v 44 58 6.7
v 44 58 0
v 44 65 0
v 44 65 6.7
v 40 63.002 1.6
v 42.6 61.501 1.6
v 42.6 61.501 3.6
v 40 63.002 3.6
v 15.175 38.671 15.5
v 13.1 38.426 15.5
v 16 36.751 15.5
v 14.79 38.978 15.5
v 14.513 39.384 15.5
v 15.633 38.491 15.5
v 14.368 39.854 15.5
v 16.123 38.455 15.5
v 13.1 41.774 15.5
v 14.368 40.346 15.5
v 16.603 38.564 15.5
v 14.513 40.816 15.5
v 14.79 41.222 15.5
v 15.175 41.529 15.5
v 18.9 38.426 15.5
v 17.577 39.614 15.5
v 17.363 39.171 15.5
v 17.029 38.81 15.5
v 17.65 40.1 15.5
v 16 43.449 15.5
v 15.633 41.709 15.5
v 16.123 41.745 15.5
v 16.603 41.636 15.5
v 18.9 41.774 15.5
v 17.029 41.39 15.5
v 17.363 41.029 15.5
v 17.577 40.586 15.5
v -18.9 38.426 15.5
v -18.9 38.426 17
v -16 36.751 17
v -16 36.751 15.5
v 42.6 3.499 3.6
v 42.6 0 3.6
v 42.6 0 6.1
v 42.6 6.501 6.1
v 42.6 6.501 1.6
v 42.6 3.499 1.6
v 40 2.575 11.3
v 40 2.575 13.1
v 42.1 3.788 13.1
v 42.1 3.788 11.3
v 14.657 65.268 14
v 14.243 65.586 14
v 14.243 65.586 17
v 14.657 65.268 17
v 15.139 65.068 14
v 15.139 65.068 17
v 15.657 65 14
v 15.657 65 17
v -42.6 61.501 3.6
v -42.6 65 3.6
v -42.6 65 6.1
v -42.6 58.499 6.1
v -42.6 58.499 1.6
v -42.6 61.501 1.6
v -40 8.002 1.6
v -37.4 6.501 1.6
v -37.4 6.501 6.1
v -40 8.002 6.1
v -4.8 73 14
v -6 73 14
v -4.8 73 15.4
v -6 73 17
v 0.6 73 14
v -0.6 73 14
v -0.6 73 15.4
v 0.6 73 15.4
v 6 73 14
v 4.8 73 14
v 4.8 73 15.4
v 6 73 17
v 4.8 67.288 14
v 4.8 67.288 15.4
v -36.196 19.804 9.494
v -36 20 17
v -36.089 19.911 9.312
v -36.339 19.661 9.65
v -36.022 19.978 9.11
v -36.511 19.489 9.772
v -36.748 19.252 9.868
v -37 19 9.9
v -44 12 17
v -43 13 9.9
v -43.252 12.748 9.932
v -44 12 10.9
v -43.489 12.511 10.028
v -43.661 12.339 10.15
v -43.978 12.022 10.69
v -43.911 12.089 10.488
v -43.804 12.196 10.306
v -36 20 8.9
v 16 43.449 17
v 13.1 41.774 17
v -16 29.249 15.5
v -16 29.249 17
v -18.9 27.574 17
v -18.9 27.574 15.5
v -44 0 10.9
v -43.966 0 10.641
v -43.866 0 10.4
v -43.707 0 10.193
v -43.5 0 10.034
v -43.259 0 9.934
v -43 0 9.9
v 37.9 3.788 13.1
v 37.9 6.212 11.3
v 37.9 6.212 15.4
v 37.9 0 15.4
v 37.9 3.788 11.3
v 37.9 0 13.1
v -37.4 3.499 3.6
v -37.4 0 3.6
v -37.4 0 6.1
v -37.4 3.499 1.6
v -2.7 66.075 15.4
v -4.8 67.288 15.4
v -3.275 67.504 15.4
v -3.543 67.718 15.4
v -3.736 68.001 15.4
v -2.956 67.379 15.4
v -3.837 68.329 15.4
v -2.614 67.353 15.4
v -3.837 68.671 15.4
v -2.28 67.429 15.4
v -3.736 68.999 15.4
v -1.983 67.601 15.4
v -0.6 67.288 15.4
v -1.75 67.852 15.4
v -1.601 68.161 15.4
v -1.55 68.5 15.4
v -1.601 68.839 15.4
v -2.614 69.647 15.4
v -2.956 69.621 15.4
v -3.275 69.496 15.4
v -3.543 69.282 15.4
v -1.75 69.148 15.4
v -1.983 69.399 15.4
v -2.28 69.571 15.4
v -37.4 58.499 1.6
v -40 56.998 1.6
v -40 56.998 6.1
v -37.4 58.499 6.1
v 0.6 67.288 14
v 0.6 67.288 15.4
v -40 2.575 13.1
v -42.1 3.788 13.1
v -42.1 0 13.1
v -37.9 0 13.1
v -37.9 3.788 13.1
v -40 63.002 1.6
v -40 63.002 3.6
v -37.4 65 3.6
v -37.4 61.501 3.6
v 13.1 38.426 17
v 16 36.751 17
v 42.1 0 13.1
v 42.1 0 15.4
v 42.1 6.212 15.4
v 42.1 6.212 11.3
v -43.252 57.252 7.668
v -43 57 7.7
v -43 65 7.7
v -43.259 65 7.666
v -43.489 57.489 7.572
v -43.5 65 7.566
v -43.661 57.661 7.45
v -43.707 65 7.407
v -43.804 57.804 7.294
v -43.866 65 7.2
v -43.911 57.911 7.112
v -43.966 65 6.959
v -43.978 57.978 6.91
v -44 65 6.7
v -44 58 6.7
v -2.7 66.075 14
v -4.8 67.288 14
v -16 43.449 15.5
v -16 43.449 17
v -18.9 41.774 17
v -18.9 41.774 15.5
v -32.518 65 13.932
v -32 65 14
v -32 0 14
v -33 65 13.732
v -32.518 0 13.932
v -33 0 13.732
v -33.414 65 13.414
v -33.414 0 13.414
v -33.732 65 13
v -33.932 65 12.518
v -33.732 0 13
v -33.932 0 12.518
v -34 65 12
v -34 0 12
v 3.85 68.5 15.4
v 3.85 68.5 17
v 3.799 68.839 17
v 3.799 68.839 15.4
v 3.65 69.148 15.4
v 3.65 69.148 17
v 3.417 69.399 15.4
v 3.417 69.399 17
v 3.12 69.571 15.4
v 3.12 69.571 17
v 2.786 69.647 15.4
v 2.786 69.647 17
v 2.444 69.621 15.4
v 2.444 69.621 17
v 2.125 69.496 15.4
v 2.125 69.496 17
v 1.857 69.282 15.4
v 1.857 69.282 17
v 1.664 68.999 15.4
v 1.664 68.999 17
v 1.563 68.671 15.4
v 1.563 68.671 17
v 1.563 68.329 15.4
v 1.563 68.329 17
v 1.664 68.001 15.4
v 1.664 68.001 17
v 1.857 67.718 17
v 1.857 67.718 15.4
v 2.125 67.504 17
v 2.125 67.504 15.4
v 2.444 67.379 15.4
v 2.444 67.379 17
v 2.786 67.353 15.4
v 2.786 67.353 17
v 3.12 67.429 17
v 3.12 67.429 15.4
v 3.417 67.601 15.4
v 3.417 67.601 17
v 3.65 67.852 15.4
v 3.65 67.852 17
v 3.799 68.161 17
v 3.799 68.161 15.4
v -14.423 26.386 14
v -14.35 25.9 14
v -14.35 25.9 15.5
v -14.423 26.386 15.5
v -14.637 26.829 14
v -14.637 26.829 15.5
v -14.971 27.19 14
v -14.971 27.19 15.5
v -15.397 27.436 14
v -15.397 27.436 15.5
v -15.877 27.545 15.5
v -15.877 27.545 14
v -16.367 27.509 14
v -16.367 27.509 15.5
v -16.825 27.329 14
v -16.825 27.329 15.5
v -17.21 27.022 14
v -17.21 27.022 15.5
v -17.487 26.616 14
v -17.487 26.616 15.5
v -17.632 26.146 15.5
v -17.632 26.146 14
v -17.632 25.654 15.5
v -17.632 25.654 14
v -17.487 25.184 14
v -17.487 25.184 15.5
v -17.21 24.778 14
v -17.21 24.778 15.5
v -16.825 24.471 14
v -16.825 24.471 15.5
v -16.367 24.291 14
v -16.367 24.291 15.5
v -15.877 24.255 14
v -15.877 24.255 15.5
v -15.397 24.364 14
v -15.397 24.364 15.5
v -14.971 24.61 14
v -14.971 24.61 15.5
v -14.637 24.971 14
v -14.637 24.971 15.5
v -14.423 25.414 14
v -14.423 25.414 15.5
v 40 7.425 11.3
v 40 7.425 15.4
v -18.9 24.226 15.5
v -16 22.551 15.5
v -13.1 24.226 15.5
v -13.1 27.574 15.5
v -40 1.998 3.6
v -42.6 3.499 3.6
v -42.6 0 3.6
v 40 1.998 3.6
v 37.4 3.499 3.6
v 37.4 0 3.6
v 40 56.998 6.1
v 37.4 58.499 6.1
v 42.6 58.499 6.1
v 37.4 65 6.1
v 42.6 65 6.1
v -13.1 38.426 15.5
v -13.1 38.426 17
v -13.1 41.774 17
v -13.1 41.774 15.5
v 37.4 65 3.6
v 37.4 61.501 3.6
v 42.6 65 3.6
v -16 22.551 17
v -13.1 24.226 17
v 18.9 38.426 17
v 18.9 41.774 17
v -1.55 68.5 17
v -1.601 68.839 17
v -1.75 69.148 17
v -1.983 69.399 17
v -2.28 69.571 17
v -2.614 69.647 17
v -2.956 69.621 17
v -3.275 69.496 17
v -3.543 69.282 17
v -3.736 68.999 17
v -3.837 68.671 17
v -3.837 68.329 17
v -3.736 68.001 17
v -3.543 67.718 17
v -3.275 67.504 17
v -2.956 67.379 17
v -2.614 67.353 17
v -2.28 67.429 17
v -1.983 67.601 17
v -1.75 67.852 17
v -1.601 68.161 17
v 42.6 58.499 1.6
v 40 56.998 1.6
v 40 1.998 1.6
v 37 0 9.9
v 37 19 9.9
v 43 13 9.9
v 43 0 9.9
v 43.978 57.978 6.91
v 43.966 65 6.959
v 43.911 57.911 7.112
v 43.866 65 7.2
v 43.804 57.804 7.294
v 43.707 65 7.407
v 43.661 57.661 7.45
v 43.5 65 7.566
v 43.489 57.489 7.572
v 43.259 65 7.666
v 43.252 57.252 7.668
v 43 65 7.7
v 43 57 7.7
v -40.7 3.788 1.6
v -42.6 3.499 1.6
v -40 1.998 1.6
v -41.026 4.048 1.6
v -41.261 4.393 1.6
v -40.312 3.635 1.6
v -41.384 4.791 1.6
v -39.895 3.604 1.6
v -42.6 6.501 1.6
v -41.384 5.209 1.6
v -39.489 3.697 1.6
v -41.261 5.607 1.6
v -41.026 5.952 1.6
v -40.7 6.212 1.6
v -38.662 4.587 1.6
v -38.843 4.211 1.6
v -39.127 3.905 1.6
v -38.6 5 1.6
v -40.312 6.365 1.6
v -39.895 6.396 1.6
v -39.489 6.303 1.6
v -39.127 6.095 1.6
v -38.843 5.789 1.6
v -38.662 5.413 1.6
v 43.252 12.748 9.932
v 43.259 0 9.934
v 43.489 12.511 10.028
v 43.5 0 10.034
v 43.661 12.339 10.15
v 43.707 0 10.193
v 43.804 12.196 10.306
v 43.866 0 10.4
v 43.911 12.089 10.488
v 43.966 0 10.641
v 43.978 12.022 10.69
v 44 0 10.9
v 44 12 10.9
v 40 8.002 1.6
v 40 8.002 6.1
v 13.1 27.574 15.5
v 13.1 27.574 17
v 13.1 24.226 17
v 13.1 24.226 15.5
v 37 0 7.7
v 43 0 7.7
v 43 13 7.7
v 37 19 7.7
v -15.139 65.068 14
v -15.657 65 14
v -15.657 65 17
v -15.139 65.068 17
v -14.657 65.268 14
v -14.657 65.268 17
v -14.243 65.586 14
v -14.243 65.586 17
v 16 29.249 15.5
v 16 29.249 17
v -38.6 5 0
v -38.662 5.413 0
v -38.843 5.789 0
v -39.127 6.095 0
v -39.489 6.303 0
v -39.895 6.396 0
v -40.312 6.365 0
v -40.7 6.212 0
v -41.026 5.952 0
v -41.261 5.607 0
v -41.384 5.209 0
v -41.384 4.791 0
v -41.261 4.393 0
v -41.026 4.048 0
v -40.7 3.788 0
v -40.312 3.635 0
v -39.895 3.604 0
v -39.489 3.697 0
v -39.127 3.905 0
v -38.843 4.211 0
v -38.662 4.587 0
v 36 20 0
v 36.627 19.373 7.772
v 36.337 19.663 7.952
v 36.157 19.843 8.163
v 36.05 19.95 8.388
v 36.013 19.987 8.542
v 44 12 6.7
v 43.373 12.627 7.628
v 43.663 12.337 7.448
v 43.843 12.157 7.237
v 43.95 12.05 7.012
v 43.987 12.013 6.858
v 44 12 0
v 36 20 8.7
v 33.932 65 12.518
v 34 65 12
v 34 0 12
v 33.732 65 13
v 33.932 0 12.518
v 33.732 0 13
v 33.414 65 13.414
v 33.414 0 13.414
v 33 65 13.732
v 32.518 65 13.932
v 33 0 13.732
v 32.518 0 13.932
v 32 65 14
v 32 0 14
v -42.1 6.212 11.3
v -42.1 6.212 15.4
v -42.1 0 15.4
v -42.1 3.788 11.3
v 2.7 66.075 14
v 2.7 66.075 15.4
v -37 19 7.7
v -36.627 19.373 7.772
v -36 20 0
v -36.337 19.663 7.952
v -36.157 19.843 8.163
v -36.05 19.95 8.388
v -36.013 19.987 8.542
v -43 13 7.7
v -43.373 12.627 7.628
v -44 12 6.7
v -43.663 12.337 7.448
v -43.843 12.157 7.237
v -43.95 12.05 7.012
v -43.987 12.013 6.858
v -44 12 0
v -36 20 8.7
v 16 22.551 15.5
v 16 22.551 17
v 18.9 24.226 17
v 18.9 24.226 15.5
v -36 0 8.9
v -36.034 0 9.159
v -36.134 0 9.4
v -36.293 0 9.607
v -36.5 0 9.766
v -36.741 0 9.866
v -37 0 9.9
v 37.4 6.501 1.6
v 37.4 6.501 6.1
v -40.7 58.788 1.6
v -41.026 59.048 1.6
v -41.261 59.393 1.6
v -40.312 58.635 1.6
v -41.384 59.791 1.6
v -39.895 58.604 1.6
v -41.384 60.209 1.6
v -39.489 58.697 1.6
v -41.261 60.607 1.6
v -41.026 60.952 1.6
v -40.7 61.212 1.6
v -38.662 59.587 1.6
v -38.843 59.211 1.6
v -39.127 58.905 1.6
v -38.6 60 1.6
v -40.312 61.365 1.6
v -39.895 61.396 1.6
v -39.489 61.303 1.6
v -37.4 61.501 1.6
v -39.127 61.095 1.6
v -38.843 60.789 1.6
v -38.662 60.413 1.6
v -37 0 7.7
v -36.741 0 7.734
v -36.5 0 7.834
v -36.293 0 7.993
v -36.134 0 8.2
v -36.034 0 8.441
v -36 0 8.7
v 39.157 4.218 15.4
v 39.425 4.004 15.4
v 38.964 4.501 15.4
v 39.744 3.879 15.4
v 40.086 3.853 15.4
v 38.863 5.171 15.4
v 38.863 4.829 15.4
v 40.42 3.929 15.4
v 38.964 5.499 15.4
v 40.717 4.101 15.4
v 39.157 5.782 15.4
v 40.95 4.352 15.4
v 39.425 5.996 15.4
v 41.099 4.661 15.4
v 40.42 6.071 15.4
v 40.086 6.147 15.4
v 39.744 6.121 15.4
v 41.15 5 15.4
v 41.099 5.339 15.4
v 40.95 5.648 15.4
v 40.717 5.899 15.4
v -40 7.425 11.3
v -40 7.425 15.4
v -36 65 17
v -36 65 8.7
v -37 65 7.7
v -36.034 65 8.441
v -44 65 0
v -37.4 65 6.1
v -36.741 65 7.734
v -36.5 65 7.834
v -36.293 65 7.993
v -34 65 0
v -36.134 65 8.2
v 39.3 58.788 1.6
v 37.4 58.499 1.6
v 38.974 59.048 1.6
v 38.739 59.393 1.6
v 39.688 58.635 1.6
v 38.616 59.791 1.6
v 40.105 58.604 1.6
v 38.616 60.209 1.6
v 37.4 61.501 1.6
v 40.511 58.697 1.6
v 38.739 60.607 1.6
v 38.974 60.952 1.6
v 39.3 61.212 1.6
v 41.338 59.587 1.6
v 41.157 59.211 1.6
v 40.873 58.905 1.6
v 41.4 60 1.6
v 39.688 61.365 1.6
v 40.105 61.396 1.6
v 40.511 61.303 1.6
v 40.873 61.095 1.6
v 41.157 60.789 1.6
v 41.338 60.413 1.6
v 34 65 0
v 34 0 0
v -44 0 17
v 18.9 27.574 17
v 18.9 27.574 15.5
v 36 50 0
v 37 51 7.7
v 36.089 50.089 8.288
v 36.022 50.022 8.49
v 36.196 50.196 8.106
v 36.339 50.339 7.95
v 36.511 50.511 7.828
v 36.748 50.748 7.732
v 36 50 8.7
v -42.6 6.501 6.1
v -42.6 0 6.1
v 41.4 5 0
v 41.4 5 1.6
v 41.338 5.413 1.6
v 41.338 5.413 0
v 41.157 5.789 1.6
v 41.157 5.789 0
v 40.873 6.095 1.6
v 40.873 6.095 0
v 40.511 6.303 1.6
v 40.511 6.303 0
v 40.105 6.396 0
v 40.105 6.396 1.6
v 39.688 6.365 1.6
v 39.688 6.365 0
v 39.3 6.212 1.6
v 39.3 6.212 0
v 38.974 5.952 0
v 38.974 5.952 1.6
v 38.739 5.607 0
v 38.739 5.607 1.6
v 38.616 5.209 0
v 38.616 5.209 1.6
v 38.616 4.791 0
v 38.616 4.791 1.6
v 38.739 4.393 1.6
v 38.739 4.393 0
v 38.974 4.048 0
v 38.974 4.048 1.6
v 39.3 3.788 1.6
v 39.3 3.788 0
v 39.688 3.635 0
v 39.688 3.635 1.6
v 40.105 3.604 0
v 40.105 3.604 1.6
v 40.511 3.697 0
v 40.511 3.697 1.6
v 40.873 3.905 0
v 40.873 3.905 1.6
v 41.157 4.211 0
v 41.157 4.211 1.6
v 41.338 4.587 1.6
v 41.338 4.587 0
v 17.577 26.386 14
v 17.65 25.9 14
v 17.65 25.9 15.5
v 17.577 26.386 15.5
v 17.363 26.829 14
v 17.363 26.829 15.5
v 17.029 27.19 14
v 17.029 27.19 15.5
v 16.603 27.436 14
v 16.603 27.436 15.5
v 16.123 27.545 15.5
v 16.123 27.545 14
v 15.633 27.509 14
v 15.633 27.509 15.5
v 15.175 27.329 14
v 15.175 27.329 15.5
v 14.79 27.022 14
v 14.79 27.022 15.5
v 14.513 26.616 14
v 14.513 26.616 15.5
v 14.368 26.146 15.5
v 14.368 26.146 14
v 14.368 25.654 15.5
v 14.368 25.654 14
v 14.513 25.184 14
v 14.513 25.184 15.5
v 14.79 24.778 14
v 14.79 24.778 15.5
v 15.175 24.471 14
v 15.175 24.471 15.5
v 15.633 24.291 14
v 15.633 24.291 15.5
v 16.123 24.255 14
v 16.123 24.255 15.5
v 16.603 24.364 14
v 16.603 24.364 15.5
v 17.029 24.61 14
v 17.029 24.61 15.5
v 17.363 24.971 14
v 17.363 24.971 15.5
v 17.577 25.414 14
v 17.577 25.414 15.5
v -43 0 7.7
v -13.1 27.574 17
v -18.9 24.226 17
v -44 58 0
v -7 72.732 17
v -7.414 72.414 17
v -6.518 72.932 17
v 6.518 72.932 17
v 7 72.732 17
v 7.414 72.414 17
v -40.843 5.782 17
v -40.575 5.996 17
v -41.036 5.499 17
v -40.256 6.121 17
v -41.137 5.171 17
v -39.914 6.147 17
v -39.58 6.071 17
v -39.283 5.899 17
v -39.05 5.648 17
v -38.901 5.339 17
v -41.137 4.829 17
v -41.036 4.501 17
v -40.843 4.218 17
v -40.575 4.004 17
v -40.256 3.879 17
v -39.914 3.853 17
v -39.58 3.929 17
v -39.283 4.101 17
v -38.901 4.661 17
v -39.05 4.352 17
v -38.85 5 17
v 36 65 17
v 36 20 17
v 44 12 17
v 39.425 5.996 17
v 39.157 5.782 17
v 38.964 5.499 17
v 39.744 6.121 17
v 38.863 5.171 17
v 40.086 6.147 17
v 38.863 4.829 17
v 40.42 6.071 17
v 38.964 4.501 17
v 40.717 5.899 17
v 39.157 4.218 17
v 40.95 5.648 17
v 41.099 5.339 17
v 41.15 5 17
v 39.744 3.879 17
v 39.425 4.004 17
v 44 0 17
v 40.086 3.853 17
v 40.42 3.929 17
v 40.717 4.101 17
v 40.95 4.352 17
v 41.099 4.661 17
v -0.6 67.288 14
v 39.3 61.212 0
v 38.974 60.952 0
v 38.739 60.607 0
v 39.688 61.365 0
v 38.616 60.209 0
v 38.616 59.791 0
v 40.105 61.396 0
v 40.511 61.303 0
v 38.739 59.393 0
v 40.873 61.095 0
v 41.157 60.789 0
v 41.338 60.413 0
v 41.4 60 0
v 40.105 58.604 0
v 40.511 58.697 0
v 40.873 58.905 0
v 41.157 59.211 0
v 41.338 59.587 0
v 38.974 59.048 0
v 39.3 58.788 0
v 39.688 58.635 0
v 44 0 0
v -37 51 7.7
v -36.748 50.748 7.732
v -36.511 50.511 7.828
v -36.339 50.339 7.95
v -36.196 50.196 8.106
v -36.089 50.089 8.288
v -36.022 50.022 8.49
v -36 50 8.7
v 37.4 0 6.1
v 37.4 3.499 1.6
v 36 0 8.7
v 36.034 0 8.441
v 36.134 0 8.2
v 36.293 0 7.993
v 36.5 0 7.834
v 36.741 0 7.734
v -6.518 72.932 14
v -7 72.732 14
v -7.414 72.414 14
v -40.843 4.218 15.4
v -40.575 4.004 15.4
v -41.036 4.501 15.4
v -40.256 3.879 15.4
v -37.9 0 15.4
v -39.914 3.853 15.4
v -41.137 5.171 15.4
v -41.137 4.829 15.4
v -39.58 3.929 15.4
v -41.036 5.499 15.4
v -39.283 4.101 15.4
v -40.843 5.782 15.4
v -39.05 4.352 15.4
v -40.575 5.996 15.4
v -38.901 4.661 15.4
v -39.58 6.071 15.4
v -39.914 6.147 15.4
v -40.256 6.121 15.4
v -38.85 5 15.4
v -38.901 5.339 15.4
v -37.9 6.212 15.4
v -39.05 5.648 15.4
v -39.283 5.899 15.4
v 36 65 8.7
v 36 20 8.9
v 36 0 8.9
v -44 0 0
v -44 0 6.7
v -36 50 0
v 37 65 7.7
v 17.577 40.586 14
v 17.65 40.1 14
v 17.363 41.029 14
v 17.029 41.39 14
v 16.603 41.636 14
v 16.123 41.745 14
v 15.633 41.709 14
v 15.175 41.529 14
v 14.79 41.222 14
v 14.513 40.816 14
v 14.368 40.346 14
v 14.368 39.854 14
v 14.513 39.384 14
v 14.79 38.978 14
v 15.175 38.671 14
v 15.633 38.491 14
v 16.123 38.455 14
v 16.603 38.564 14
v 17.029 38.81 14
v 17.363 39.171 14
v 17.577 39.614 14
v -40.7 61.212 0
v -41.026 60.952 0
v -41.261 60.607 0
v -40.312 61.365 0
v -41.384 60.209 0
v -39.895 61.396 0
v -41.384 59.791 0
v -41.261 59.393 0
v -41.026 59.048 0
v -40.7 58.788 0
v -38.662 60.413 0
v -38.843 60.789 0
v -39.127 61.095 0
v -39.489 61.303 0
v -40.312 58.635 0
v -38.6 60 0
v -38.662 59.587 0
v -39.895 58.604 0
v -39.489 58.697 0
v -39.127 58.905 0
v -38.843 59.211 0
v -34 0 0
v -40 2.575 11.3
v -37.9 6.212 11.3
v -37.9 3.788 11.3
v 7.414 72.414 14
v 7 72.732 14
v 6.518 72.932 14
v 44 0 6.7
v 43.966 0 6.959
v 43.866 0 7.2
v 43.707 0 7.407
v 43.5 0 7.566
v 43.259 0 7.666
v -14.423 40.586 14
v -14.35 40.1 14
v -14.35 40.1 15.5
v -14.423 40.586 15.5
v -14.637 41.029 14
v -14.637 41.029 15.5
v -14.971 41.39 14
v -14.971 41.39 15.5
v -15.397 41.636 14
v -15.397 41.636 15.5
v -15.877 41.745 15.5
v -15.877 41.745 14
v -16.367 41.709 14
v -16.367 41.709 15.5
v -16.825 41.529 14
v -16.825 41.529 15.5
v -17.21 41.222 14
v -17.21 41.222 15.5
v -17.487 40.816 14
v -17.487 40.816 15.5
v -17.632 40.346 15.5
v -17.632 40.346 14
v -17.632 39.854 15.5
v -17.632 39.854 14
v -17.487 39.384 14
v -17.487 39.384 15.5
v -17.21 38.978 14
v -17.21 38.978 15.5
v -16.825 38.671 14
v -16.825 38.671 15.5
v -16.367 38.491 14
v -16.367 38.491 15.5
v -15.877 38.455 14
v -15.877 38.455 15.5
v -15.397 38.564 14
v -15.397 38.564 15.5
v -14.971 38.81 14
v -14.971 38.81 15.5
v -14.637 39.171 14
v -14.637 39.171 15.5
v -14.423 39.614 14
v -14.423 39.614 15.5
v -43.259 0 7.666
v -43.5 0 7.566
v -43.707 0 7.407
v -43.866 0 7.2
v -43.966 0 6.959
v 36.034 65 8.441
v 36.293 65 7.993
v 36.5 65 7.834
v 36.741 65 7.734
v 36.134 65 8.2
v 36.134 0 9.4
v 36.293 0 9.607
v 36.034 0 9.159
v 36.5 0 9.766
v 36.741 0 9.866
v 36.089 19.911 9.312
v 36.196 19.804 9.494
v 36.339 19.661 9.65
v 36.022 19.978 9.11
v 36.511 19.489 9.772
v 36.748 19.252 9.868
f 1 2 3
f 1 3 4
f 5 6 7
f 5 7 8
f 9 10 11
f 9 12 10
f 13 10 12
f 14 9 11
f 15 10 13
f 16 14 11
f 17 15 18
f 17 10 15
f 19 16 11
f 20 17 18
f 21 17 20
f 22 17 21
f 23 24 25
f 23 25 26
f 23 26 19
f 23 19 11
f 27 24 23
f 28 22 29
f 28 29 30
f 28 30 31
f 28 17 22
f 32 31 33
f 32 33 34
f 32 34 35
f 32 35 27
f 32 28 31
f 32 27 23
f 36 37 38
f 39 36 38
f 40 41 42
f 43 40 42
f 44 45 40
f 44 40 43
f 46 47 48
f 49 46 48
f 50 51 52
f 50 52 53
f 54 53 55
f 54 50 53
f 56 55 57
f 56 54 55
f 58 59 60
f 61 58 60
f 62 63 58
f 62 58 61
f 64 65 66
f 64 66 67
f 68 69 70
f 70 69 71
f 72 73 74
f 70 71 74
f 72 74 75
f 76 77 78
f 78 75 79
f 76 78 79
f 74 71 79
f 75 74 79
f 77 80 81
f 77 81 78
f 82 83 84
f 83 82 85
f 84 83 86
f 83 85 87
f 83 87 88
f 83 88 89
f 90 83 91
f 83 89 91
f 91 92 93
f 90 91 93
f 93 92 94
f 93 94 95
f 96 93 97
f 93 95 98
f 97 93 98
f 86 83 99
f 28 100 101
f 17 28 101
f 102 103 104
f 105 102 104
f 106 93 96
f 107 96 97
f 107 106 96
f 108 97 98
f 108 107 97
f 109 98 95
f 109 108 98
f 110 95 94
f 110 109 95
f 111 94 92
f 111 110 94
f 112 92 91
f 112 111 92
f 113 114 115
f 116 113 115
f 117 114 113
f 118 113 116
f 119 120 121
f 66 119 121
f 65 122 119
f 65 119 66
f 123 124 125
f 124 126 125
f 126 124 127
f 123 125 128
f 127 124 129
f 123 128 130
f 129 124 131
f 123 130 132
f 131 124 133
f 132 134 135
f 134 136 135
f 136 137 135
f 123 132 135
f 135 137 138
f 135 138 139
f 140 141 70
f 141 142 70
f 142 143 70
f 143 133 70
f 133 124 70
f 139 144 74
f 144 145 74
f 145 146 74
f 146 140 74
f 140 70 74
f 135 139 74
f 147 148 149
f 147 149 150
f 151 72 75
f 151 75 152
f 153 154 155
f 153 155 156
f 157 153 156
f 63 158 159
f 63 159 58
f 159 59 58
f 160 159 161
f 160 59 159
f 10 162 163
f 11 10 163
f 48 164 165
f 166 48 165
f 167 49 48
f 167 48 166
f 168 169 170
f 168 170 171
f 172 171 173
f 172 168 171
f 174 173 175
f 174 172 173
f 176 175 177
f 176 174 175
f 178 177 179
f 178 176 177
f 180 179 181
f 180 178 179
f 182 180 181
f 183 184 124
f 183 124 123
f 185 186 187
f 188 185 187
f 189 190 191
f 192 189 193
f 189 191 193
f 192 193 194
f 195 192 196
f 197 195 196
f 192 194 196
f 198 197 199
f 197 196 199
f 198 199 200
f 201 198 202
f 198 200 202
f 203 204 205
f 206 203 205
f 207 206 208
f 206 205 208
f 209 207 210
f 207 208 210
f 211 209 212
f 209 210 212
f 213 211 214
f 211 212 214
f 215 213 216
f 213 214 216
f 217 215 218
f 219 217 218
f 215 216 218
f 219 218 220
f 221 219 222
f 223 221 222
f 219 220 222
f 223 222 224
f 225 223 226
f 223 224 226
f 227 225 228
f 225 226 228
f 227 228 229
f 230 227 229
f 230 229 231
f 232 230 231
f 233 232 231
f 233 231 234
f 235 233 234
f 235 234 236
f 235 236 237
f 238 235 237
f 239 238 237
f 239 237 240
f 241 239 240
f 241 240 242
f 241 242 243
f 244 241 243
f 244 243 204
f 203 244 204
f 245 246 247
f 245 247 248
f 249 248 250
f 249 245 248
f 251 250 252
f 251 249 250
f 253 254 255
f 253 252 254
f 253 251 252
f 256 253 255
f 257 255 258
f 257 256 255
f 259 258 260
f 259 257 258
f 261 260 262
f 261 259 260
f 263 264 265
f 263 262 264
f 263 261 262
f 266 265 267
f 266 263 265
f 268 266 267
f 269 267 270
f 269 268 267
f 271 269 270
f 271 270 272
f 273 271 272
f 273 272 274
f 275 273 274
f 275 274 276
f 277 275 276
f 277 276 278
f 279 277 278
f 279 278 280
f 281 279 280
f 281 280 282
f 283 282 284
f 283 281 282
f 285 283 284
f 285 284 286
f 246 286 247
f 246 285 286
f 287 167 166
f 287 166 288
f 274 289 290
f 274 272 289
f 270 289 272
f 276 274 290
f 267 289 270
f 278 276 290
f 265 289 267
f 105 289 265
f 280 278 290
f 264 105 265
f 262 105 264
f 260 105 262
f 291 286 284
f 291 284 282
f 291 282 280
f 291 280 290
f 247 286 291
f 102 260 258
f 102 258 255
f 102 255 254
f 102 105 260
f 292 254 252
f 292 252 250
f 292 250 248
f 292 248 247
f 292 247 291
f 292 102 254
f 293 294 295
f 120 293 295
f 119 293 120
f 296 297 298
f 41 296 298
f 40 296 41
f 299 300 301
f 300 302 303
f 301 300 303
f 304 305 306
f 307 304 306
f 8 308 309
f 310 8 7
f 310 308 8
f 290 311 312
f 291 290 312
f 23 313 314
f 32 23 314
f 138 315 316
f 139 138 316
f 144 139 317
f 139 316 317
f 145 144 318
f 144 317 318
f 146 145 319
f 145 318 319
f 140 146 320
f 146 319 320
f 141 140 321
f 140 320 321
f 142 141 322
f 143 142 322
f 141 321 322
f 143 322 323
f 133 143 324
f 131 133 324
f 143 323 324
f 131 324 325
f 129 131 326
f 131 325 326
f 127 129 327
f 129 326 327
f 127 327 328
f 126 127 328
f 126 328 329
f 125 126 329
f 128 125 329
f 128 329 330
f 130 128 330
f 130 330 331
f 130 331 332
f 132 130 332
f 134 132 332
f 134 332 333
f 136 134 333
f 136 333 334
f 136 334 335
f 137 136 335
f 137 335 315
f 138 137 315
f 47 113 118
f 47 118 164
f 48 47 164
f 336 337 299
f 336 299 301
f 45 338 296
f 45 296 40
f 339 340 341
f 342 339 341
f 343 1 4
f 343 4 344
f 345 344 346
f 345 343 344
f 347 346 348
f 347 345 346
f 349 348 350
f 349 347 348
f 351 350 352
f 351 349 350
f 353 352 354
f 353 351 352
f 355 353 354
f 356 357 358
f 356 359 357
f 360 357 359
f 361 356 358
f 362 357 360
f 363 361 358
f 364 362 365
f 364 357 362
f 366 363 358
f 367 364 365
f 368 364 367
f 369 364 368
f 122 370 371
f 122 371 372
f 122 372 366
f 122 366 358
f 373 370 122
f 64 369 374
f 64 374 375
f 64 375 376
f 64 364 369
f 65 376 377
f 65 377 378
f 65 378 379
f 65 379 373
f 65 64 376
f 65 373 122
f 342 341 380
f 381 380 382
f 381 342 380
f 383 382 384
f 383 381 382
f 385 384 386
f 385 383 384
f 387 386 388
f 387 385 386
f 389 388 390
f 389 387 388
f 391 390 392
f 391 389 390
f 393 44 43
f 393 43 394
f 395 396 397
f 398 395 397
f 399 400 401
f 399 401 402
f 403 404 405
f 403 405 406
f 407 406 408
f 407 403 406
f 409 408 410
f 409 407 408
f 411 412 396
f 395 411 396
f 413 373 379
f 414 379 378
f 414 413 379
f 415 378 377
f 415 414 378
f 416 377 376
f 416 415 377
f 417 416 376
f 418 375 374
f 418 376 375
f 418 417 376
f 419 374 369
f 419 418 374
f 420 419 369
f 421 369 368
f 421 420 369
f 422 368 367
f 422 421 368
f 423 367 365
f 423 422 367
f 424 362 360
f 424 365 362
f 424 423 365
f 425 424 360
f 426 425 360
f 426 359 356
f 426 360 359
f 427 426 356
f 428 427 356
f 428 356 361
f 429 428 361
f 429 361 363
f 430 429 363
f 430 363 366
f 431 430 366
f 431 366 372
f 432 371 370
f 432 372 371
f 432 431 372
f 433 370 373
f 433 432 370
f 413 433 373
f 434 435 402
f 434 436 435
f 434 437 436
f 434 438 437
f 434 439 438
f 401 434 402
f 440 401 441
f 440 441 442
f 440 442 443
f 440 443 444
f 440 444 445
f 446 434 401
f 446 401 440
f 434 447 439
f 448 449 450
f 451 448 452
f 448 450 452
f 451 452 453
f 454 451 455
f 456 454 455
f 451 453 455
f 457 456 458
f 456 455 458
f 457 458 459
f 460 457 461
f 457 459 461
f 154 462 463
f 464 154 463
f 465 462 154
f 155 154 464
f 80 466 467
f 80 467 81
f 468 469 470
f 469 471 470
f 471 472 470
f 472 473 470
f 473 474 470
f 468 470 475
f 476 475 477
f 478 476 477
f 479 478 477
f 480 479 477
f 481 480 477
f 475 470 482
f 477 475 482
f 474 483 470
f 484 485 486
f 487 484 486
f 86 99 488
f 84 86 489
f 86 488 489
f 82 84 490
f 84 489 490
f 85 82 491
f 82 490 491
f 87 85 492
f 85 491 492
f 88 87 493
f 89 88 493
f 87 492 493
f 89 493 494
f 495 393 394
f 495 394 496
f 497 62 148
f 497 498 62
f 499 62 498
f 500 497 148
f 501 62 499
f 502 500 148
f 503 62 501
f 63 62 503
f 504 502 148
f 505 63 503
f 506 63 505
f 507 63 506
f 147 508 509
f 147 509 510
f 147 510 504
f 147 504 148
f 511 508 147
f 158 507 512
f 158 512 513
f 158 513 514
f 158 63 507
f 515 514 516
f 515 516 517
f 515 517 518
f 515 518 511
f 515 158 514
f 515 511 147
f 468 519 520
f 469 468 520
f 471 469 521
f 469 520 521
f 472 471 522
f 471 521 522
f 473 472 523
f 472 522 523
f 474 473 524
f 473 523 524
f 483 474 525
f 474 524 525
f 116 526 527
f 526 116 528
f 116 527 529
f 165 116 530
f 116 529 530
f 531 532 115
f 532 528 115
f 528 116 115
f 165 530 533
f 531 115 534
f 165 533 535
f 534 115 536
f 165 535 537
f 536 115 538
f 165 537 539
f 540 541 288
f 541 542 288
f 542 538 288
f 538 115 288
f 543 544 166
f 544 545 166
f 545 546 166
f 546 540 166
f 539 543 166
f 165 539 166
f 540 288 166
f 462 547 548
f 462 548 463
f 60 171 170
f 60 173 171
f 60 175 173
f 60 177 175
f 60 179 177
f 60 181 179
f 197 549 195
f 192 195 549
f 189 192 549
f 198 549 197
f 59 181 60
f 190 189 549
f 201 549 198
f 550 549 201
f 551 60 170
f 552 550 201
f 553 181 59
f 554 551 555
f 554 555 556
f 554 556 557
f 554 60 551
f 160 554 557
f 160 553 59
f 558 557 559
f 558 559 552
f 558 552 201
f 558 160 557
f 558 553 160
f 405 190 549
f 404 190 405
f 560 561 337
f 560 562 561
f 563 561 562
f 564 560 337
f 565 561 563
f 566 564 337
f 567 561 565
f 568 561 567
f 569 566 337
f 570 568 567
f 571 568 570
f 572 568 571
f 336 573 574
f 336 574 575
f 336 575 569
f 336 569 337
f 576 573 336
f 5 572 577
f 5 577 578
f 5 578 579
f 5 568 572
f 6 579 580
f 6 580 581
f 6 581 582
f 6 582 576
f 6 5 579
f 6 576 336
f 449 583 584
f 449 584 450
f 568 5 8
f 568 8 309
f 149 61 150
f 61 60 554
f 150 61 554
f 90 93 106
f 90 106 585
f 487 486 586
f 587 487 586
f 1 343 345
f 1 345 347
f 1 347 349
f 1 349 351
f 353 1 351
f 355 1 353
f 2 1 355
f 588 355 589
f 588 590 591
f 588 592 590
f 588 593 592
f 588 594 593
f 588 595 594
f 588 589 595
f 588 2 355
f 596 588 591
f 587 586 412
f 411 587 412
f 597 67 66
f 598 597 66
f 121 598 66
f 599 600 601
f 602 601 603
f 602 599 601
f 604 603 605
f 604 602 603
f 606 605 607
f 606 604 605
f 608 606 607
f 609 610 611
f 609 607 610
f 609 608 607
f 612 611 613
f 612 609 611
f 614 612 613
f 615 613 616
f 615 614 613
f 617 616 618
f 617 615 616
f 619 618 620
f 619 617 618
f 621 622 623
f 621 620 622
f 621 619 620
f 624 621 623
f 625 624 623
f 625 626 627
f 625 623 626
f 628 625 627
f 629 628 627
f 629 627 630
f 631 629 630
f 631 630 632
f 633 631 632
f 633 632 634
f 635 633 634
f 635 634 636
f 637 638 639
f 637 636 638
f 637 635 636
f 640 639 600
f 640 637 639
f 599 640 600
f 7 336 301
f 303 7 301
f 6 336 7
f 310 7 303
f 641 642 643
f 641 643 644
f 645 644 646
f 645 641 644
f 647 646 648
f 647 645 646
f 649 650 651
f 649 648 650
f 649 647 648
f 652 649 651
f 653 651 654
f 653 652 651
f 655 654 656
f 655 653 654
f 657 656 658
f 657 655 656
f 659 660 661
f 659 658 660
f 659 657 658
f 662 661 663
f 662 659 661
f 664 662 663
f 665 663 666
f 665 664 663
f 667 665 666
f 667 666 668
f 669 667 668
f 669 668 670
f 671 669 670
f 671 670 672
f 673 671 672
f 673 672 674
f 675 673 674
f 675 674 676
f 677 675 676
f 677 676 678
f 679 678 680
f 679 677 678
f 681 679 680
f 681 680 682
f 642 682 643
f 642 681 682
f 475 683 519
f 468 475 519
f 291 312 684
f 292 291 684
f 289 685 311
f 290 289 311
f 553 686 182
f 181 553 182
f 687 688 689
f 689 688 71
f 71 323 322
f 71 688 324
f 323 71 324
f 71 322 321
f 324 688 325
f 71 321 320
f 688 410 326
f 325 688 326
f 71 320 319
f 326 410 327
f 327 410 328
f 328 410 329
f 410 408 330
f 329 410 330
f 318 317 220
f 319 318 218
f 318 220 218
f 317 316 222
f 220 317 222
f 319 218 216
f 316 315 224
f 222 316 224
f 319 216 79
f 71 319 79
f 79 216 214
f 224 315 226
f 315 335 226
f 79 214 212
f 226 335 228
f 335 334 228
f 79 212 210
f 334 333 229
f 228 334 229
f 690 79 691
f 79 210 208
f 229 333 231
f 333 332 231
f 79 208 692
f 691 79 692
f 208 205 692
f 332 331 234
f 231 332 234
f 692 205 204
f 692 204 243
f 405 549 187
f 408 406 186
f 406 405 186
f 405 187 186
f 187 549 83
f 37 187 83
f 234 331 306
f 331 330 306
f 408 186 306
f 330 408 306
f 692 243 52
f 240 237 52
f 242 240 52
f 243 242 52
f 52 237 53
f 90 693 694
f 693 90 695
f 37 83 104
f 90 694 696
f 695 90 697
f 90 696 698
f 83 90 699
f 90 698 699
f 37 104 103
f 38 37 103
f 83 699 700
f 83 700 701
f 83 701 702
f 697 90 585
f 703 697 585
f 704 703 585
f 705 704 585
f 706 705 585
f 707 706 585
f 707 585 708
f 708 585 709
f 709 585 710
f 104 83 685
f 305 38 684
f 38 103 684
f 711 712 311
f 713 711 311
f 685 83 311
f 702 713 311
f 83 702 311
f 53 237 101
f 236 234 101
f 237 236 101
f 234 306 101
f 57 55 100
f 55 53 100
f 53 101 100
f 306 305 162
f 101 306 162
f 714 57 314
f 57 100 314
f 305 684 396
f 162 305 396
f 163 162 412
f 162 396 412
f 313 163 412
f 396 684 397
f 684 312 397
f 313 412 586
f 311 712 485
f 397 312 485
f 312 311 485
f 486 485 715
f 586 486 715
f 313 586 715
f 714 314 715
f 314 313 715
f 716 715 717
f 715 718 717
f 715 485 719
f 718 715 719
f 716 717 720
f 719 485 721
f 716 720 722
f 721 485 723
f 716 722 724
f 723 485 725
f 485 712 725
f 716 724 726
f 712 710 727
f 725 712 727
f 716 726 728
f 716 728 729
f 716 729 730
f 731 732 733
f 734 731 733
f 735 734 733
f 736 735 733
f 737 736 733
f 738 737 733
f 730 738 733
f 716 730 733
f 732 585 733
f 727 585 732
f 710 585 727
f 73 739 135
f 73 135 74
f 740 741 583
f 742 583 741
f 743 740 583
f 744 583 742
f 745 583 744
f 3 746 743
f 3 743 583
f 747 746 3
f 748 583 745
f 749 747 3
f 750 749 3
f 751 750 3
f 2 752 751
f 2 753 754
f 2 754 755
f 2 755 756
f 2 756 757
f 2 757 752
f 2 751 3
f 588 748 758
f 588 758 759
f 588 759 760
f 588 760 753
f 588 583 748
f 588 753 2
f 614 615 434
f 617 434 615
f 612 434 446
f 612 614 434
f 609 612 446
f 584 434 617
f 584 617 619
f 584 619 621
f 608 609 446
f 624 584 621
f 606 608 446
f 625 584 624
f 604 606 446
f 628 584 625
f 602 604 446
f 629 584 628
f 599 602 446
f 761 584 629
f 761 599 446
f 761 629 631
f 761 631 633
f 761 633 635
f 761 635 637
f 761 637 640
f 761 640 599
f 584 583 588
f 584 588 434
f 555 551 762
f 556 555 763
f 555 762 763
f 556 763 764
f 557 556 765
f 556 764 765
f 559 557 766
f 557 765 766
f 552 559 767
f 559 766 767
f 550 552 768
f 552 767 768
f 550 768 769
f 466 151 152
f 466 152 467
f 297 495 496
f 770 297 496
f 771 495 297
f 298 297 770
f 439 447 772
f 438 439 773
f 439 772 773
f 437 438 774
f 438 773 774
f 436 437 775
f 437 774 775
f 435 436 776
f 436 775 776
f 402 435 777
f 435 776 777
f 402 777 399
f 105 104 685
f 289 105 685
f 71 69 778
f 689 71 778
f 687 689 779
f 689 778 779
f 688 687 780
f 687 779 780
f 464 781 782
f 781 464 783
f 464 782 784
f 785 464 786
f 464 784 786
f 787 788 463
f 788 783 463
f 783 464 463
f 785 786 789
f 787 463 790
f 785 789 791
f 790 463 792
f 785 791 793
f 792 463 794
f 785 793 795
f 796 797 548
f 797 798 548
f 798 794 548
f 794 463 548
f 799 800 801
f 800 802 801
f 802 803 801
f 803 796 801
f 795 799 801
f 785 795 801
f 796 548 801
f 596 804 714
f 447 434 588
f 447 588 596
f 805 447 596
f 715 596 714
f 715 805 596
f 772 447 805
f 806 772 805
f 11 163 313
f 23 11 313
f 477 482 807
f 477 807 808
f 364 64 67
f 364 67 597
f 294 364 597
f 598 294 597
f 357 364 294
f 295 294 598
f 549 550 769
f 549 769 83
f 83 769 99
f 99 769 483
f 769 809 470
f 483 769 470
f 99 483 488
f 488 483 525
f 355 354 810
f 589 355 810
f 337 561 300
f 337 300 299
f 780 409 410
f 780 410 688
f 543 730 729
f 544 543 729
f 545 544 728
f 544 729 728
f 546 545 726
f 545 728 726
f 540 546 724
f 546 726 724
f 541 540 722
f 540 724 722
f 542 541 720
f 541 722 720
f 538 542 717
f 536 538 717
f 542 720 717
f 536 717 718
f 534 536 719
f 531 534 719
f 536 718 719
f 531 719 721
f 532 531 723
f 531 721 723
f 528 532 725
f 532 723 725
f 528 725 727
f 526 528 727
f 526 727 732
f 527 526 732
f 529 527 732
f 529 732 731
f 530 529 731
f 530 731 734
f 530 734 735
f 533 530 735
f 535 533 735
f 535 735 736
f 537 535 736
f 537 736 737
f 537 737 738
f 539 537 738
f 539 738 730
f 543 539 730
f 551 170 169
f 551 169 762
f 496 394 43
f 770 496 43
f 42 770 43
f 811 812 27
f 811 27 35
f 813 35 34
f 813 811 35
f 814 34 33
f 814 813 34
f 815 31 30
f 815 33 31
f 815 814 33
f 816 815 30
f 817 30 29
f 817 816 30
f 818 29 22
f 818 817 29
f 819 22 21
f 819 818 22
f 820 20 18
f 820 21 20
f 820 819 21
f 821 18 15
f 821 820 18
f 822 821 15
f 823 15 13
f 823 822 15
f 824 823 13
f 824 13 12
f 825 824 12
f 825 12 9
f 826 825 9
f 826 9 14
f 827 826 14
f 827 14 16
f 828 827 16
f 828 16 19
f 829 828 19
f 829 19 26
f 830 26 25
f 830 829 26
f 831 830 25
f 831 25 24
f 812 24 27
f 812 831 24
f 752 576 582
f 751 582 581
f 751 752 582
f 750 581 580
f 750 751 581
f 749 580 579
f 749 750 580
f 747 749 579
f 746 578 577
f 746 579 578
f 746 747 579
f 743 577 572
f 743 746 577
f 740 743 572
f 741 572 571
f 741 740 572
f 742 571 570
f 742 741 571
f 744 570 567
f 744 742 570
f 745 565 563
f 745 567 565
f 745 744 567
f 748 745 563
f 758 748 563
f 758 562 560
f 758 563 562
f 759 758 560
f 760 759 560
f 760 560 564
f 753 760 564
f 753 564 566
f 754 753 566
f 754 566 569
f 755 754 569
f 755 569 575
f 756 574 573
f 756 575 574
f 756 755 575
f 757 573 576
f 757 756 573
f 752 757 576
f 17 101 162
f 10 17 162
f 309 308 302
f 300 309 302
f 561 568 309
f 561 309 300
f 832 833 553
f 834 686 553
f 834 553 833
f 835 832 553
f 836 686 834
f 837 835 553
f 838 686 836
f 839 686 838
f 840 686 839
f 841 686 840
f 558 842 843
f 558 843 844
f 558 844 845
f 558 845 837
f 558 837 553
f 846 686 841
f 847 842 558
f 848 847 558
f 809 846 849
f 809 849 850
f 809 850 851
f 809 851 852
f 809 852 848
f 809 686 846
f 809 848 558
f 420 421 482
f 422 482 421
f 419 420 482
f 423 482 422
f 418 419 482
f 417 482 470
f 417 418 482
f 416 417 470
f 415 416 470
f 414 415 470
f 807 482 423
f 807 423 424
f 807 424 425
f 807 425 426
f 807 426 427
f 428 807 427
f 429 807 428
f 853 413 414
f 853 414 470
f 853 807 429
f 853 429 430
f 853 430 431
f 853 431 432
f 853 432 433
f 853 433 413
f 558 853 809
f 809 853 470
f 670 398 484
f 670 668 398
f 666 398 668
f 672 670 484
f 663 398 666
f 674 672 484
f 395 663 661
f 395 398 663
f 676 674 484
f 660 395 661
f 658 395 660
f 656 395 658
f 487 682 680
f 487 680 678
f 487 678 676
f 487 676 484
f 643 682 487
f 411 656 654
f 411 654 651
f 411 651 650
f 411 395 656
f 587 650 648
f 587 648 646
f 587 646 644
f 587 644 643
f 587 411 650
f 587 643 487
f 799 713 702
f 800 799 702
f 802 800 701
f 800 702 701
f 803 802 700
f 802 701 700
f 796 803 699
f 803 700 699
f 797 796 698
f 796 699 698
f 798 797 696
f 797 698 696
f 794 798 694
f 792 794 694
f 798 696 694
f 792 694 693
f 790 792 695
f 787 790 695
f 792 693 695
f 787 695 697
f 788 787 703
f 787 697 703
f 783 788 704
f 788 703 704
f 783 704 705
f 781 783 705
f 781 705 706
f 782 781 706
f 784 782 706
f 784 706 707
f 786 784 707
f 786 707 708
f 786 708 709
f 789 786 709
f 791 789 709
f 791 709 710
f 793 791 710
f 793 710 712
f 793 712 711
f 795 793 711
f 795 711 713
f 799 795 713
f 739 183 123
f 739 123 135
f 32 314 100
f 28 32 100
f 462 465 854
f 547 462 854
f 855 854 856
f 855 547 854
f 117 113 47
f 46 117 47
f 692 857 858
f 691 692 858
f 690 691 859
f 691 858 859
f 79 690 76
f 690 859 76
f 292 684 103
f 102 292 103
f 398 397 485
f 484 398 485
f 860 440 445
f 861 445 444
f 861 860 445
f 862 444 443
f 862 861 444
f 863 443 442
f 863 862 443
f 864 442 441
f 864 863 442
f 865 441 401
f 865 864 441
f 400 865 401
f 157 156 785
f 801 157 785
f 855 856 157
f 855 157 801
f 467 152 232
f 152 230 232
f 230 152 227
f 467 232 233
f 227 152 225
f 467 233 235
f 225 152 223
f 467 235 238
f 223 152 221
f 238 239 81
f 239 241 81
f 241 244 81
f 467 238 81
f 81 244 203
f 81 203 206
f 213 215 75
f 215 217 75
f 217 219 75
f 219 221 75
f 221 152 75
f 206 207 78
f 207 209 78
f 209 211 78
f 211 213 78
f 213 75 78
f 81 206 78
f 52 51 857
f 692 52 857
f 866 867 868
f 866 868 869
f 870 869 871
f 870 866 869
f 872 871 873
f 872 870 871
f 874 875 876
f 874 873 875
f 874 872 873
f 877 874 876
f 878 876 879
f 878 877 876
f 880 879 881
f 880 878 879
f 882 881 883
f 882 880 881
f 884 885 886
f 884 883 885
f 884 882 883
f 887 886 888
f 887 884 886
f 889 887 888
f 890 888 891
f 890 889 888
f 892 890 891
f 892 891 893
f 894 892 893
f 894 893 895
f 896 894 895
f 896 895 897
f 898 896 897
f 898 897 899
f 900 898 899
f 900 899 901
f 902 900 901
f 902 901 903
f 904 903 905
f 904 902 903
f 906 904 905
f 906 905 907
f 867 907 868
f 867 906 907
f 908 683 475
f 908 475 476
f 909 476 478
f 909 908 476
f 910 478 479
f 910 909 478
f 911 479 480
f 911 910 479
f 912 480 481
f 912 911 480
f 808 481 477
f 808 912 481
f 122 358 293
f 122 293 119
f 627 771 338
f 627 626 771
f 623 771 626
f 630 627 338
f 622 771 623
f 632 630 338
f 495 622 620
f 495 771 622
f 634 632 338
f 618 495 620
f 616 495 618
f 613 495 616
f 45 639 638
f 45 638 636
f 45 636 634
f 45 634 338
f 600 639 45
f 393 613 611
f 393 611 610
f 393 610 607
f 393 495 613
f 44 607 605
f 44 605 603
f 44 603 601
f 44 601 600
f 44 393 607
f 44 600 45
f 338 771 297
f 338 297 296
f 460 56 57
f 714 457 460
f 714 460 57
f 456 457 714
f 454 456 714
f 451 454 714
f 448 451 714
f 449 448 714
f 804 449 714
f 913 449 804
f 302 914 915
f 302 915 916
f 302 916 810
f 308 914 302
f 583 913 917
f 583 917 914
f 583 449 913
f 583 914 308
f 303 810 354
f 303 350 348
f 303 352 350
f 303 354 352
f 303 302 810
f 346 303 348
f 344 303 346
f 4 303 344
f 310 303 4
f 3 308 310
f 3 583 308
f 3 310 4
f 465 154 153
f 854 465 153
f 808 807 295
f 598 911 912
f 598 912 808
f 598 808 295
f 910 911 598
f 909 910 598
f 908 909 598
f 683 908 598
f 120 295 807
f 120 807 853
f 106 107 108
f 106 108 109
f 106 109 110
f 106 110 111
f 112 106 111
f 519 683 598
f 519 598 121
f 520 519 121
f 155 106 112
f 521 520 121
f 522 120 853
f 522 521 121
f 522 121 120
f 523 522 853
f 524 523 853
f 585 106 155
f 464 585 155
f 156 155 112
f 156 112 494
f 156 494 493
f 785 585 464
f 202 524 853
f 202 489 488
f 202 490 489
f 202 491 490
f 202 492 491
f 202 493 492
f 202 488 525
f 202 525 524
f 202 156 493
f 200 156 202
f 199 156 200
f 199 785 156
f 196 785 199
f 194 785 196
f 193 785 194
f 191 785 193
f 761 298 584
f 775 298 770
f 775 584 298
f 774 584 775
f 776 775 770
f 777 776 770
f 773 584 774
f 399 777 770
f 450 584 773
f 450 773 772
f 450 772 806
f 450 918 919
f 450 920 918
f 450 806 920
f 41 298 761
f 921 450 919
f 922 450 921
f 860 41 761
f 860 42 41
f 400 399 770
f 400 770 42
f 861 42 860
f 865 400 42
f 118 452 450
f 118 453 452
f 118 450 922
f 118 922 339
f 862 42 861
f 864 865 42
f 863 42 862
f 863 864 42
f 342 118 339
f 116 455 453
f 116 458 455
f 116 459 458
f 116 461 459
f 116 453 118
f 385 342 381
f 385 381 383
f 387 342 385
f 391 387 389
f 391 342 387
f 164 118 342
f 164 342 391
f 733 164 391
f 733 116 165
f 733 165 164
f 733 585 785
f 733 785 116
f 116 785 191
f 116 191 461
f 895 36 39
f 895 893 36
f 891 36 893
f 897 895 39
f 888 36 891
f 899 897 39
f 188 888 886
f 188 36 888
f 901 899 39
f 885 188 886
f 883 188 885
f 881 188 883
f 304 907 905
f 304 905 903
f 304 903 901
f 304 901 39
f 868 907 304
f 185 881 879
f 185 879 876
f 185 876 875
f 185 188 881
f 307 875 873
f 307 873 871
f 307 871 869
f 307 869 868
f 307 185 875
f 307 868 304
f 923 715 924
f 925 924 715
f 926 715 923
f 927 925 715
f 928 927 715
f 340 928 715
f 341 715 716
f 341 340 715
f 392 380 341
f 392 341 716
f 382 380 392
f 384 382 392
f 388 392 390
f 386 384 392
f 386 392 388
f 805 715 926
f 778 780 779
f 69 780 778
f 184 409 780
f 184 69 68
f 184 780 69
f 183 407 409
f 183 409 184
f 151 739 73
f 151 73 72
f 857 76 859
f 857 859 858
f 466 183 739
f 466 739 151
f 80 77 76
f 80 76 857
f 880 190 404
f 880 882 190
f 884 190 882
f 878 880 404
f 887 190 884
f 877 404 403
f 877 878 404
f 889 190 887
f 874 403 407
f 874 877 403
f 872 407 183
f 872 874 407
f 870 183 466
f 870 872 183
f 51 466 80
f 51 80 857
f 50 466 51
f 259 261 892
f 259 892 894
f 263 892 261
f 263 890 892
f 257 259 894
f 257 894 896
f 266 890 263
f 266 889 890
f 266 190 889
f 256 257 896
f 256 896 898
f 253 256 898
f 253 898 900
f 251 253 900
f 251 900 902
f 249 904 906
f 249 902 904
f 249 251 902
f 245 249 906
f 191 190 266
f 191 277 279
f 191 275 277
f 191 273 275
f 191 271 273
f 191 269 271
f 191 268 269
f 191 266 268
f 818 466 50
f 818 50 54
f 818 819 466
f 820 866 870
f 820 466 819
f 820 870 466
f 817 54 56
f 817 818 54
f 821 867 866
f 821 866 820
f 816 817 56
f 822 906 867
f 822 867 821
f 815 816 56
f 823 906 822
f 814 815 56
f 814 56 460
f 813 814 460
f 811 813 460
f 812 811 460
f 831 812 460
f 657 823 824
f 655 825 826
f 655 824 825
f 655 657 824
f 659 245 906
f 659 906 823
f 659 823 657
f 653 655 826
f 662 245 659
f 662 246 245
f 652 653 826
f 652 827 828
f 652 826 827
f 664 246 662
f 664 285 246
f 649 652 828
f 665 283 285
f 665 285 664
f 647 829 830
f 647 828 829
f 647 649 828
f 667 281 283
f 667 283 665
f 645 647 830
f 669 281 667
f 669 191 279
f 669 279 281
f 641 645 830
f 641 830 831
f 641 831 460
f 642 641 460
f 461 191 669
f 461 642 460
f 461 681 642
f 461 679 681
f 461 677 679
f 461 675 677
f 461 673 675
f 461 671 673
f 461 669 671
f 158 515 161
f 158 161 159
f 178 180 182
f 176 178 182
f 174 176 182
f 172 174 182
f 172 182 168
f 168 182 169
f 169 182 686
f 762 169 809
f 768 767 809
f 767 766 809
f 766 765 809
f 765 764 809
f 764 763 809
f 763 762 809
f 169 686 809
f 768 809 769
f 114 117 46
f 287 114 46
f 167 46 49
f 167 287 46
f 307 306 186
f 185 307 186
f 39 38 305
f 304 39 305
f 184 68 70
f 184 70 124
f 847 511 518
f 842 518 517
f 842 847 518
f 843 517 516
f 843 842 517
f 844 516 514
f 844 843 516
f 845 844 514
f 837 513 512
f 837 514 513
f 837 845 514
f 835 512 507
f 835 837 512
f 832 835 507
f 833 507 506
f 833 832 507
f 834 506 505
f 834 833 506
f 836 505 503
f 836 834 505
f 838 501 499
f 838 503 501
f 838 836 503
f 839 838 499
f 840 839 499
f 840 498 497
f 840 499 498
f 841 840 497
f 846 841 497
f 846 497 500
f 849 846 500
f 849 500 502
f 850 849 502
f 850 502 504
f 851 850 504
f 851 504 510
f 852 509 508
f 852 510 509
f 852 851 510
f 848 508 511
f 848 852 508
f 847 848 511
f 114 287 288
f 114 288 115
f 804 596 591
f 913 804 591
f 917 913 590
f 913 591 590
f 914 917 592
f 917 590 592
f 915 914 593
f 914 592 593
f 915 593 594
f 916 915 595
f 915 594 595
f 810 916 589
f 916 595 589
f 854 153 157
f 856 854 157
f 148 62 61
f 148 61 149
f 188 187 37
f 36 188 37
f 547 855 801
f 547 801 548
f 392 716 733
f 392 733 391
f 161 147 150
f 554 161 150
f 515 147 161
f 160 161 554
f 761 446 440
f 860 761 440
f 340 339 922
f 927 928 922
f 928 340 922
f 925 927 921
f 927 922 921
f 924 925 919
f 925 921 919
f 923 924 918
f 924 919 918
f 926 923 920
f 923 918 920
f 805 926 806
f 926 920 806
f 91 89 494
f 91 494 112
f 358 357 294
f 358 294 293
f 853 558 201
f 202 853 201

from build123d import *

# Parameters (mm, degrees)
PAD_DEPTH       = 73
POCKET_DEPTH    = 17.001
SKETCH006_R     = 1.4
POCKET001_DEPTH = 5.7
POCKET002_DEPTH = 2.5
POCKET003_DEPTH = 2
SKETCH007_R     = 1.65
POCKET004_DEPTH = 17.001
POCKET007_DEPTH = 1.5
SKETCH021_R     = 1.15
POCKET012_DEPTH = 5.7
POCKET014_DEPTH = 1.8
POCKET015_DEPTH = 2.3
POCKET017_DEPTH = 17.001
SKETCH028_W     = 44
SKETCH028_H     = 65
POCKET018_DEPTH = 8.2


with BuildPart() as part:
    # Sketch → Pad (new body)
    with BuildSketch(Plane.XZ):
        with BuildLine():
            Line((-44, 0), (-34, 0))
            Line((-34, 0), (-34, 12))
            ThreePointArc((-32, 14), (-33.414214, 13.414214), (-34, 12))
            Line((-32, 14), (32, 14))
            ThreePointArc((34, 12), (33.414214, 13.414214), (32, 14))
            Line((34, 0), (34, 12))
            Line((34, 0), (44, 0))
            Line((44, 0), (44, 6.7))
            ThreePointArc((44, 6.7), (43.707107, 7.407107), (43, 7.7))
            Line((43, 7.7), (37, 7.7))
            ThreePointArc((36, 8.7), (36.292893, 7.992893), (37, 7.7))
            Line((36, 8.7), (36, 8.9))
            ThreePointArc((37, 9.9), (36.292893, 9.607107), (36, 8.9))
            Line((37, 9.9), (43, 9.9))
            ThreePointArc((43, 9.9), (43.707107, 10.192893), (44, 10.9))
            Line((44, 17), (44, 10.9))
            Line((-44, 17), (44, 17))
            Line((-44, 10.9), (-44, 17))
            ThreePointArc((-44, 10.9), (-43.707107, 10.192893), (-43, 9.9))
            Line((-37, 9.9), (-43, 9.9))
            ThreePointArc((-36, 8.9), (-36.292893, 9.607107), (-37, 9.9))
            Line((-36, 8.7), (-36, 8.9))
            ThreePointArc((-37, 7.7), (-36.292893, 7.992893), (-36, 8.7))
            Line((-43, 7.7), (-37, 7.7))
            ThreePointArc((-43, 7.7), (-43.707107, 7.407107), (-44, 6.7))
            Line((-44, 0), (-44, 6.7))
        make_face()
    extrude(amount=-PAD_DEPTH)

    # Sketch001 → Pocket (cut, through all)
    with BuildSketch(Plane.XY):
        Polygon((-66, 80), (-36, 50), (-36, 20), (-66, -10), align=None)
        Polygon((36, 20), (66, -10), (66, 80), (36, 50), align=None)
    extrude(amount=POCKET_DEPTH, mode=Mode.SUBTRACT)

    # Sketch006 → Pocket001 (cut)
    with BuildSketch(Plane.XY):
        with Locations((-40, 60)):
            Circle(SKETCH006_R)
        with Locations((40, 60)):
            Circle(SKETCH006_R)
        with Locations((40, 5)):
            Circle(SKETCH006_R)
        with Locations((-40, 5)):
            Circle(SKETCH006_R)
    extrude(amount=POCKET001_DEPTH, mode=Mode.SUBTRACT)

    # Sketch005 (on DatumPlane) → Pocket002 (cut)
    with BuildSketch(Plane.XY.offset(3.6)):
        Polygon((-37.4, 3.498889), (-37.4, 6.501111), (-40, 8.002221), (-42.6, 6.501111), (-42.6, 3.498889), (-42.6, -6.501111), (-37.4, -6.501111), align=None)
        Polygon((42.6, 3.498889), (42.6, 6.501111), (40, 8.002221), (37.4, 6.501111), (37.4, 3.498889), (37.4, -6.501111), (42.6, -6.501111), align=None)
        Polygon((-40, 56.997779), (-37.4, 58.498889), (-37.4, 61.501111), (-37.4, 71.501111), (-42.6, 71.501111), (-42.6, 61.501111), (-42.6, 58.498889), align=None)
        Polygon((37.4, 58.498889), (40, 56.997779), (42.6, 58.498889), (42.6, 61.501111), (42.6, 71.501111), (37.4, 71.501111), (37.4, 61.501111), align=None)
    extrude(amount=POCKET002_DEPTH, mode=Mode.SUBTRACT)

    # Sketch004 (on DatumPlane) → Pocket003 (cut)
    with BuildSketch(Plane.XY.offset(1.6)):
        Polygon((-40, 1.997779), (-37.4, 3.498889), (-37.4, 6.501111), (-40, 8.002221), (-42.6, 6.501111), (-42.6, 3.498889), align=None)
        Polygon((40, 1.997779), (42.6, 3.498889), (42.6, 6.501111), (40, 8.002221), (37.4, 6.501111), (37.4, 3.498889), align=None)
        Polygon((40, 56.997779), (42.6, 58.498889), (42.6, 61.501111), (40, 63.002221), (37.4, 61.501111), (37.4, 58.498889), align=None)
        Polygon((-40, 56.997779), (-37.4, 58.498889), (-37.4, 61.501111), (-40, 63.002221), (-42.6, 61.501111), (-42.6, 58.498889), align=None)
    extrude(amount=POCKET003_DEPTH, mode=Mode.SUBTRACT)

    # Sketch007 → Pocket004 (cut, through all)
    with BuildSketch(Plane.XY):
        with Locations((-16, 40.1)):
            Circle(SKETCH007_R)
        with Locations((-16, 25.9)):
            Circle(SKETCH007_R)
        with Locations((16, 40.1)):
            Circle(SKETCH007_R)
        with Locations((16, 25.9)):
            Circle(SKETCH007_R)
    extrude(amount=POCKET004_DEPTH, mode=Mode.SUBTRACT)

    # Sketch008 (on DatumPlane) → Pocket007 (cut)
    with BuildSketch(Plane.XY.offset(17)):
        Polygon((-18.9, 41.774316), (-18.9, 38.425684), (-16, 36.751368), (-13.1, 38.425684), (-13.1, 41.774316), (-16, 43.448632), align=None)
        Polygon((13.1, 41.774316), (13.1, 38.425684), (16, 36.751368), (18.9, 38.425684), (18.9, 41.774316), (16, 43.448632), align=None)
        Polygon((-18.9, 27.574316), (-18.9, 24.225684), (-16, 22.551368), (-13.1, 24.225684), (-13.1, 27.574316), (-16, 29.248632), align=None)
        Polygon((13.1, 27.574316), (13.1, 24.225684), (16, 22.551368), (18.9, 24.225684), (18.9, 27.574316), (16, 29.248632), align=None)
    extrude(amount=-POCKET007_DEPTH, mode=Mode.SUBTRACT)

    # Sketch021 (on DatumPlane) → Pocket012 (cut)
    with BuildSketch(Plane.XY.offset(17)):
        with Locations((-2.7, 68.5)):
            Circle(SKETCH021_R)
        with Locations((2.7, 68.5)):
            Circle(SKETCH021_R)
        with Locations((-40, 5)):
            Circle(SKETCH021_R)
        with Locations((40, 5)):
            Circle(SKETCH021_R)
    extrude(amount=-POCKET012_DEPTH, mode=Mode.SUBTRACT)

    # Sketch024 (on DatumPlane) → Pocket014 (cut)
    with BuildSketch(Plane.XY.offset(13.1)):
        Polygon((0.6, 67.287564), (2.7, 66.075129), (4.8, 67.287564), (4.8, 69.712436), (2.7, 70.924871), (0.6, 69.712436), align=None)
        Polygon((40, 7.424871), (37.9, 6.212436), (37.9, 3.787564), (40, 2.575129), (42.1, 3.787564), (42.1, 6.212436), align=None)
        Polygon((-37.9, 6.212436), (-40, 7.424871), (-42.1, 6.212436), (-42.1, 3.787564), (-40, 2.575129), (-37.9, 3.787564), align=None)
        Polygon((-4.8, 67.287564), (-2.7, 66.075129), (-0.6, 67.287564), (-0.6, 69.712436), (-2.7, 70.924871), (-4.8, 69.712436), align=None)
    extrude(amount=-POCKET014_DEPTH, mode=Mode.SUBTRACT)

    # Sketch025 (on DatumPlane) → Pocket015 (cut)
    with BuildSketch(Plane.XY.offset(13.1)):
        Polygon((2.7, 66.075129), (4.8, 67.287564), (4.8, 69.712436), (4.8, 89.712436), (0.6, 89.712436), (0.6, 69.712436), (0.6, 67.287564), align=None)
        Polygon((40, 7.424871), (37.9, 6.212436), (37.9, 3.787564), (37.9, -16.212436), (42.1, -16.212436), (42.1, 3.787564), (42.1, 6.212436), align=None)
        Polygon((-40, 7.424871), (-42.1, 6.212436), (-42.1, 3.787564), (-42.1, -16.212436), (-37.9, -16.212436), (-37.9, 3.787564), (-37.9, 6.212436), align=None)
        Polygon((-2.7, 66.075129), (-0.6, 67.287564), (-0.6, 69.712436), (-0.6, 89.712436), (-4.8, 89.712436), (-4.8, 69.712436), (-4.8, 67.287564), align=None)
    extrude(amount=POCKET015_DEPTH, mode=Mode.SUBTRACT)

    # Sketch027 → Pocket017 (cut, through all)
    with BuildSketch(Plane.XY):
        with BuildLine():
            Line((-65, 65), (-15.656854, 65))
            ThreePointArc((-15.656854, 65), (-14.891487, 65.152241), (-14.242641, 65.585786))
            Line((-14.242641, 65.585786), (-7.414214, 72.414214))
            ThreePointArc((-6, 73), (-6.765367, 72.847759), (-7.414214, 72.414214))
            Line((-6, 73), (6, 73))
            ThreePointArc((7.414214, 72.414214), (6.765367, 72.847759), (6, 73))
            Line((14.242641, 65.585786), (7.414214, 72.414214))
            ThreePointArc((14.242641, 65.585786), (14.891487, 65.152241), (15.656854, 65))
            Line((15.656854, 65), (65, 65))
            Line((65, 65), (65, 97))
            Line((65, 97), (-65, 97))
            Line((-65, 65), (-65, 97))
        make_face()
    extrude(amount=POCKET017_DEPTH, mode=Mode.SUBTRACT)

    # Sketch028 (on DatumPlane) → Pocket018 (cut)
    with BuildSketch(Plane.XY.offset(17)):
        with Locations((-58, 65)):
            Rectangle(SKETCH028_W, SKETCH028_H)
        with Locations((58, 65)):
            Rectangle(SKETCH028_W, SKETCH028_H)
    extrude(amount=-POCKET018_DEPTH, mode=Mode.SUBTRACT)


solid = part.part
